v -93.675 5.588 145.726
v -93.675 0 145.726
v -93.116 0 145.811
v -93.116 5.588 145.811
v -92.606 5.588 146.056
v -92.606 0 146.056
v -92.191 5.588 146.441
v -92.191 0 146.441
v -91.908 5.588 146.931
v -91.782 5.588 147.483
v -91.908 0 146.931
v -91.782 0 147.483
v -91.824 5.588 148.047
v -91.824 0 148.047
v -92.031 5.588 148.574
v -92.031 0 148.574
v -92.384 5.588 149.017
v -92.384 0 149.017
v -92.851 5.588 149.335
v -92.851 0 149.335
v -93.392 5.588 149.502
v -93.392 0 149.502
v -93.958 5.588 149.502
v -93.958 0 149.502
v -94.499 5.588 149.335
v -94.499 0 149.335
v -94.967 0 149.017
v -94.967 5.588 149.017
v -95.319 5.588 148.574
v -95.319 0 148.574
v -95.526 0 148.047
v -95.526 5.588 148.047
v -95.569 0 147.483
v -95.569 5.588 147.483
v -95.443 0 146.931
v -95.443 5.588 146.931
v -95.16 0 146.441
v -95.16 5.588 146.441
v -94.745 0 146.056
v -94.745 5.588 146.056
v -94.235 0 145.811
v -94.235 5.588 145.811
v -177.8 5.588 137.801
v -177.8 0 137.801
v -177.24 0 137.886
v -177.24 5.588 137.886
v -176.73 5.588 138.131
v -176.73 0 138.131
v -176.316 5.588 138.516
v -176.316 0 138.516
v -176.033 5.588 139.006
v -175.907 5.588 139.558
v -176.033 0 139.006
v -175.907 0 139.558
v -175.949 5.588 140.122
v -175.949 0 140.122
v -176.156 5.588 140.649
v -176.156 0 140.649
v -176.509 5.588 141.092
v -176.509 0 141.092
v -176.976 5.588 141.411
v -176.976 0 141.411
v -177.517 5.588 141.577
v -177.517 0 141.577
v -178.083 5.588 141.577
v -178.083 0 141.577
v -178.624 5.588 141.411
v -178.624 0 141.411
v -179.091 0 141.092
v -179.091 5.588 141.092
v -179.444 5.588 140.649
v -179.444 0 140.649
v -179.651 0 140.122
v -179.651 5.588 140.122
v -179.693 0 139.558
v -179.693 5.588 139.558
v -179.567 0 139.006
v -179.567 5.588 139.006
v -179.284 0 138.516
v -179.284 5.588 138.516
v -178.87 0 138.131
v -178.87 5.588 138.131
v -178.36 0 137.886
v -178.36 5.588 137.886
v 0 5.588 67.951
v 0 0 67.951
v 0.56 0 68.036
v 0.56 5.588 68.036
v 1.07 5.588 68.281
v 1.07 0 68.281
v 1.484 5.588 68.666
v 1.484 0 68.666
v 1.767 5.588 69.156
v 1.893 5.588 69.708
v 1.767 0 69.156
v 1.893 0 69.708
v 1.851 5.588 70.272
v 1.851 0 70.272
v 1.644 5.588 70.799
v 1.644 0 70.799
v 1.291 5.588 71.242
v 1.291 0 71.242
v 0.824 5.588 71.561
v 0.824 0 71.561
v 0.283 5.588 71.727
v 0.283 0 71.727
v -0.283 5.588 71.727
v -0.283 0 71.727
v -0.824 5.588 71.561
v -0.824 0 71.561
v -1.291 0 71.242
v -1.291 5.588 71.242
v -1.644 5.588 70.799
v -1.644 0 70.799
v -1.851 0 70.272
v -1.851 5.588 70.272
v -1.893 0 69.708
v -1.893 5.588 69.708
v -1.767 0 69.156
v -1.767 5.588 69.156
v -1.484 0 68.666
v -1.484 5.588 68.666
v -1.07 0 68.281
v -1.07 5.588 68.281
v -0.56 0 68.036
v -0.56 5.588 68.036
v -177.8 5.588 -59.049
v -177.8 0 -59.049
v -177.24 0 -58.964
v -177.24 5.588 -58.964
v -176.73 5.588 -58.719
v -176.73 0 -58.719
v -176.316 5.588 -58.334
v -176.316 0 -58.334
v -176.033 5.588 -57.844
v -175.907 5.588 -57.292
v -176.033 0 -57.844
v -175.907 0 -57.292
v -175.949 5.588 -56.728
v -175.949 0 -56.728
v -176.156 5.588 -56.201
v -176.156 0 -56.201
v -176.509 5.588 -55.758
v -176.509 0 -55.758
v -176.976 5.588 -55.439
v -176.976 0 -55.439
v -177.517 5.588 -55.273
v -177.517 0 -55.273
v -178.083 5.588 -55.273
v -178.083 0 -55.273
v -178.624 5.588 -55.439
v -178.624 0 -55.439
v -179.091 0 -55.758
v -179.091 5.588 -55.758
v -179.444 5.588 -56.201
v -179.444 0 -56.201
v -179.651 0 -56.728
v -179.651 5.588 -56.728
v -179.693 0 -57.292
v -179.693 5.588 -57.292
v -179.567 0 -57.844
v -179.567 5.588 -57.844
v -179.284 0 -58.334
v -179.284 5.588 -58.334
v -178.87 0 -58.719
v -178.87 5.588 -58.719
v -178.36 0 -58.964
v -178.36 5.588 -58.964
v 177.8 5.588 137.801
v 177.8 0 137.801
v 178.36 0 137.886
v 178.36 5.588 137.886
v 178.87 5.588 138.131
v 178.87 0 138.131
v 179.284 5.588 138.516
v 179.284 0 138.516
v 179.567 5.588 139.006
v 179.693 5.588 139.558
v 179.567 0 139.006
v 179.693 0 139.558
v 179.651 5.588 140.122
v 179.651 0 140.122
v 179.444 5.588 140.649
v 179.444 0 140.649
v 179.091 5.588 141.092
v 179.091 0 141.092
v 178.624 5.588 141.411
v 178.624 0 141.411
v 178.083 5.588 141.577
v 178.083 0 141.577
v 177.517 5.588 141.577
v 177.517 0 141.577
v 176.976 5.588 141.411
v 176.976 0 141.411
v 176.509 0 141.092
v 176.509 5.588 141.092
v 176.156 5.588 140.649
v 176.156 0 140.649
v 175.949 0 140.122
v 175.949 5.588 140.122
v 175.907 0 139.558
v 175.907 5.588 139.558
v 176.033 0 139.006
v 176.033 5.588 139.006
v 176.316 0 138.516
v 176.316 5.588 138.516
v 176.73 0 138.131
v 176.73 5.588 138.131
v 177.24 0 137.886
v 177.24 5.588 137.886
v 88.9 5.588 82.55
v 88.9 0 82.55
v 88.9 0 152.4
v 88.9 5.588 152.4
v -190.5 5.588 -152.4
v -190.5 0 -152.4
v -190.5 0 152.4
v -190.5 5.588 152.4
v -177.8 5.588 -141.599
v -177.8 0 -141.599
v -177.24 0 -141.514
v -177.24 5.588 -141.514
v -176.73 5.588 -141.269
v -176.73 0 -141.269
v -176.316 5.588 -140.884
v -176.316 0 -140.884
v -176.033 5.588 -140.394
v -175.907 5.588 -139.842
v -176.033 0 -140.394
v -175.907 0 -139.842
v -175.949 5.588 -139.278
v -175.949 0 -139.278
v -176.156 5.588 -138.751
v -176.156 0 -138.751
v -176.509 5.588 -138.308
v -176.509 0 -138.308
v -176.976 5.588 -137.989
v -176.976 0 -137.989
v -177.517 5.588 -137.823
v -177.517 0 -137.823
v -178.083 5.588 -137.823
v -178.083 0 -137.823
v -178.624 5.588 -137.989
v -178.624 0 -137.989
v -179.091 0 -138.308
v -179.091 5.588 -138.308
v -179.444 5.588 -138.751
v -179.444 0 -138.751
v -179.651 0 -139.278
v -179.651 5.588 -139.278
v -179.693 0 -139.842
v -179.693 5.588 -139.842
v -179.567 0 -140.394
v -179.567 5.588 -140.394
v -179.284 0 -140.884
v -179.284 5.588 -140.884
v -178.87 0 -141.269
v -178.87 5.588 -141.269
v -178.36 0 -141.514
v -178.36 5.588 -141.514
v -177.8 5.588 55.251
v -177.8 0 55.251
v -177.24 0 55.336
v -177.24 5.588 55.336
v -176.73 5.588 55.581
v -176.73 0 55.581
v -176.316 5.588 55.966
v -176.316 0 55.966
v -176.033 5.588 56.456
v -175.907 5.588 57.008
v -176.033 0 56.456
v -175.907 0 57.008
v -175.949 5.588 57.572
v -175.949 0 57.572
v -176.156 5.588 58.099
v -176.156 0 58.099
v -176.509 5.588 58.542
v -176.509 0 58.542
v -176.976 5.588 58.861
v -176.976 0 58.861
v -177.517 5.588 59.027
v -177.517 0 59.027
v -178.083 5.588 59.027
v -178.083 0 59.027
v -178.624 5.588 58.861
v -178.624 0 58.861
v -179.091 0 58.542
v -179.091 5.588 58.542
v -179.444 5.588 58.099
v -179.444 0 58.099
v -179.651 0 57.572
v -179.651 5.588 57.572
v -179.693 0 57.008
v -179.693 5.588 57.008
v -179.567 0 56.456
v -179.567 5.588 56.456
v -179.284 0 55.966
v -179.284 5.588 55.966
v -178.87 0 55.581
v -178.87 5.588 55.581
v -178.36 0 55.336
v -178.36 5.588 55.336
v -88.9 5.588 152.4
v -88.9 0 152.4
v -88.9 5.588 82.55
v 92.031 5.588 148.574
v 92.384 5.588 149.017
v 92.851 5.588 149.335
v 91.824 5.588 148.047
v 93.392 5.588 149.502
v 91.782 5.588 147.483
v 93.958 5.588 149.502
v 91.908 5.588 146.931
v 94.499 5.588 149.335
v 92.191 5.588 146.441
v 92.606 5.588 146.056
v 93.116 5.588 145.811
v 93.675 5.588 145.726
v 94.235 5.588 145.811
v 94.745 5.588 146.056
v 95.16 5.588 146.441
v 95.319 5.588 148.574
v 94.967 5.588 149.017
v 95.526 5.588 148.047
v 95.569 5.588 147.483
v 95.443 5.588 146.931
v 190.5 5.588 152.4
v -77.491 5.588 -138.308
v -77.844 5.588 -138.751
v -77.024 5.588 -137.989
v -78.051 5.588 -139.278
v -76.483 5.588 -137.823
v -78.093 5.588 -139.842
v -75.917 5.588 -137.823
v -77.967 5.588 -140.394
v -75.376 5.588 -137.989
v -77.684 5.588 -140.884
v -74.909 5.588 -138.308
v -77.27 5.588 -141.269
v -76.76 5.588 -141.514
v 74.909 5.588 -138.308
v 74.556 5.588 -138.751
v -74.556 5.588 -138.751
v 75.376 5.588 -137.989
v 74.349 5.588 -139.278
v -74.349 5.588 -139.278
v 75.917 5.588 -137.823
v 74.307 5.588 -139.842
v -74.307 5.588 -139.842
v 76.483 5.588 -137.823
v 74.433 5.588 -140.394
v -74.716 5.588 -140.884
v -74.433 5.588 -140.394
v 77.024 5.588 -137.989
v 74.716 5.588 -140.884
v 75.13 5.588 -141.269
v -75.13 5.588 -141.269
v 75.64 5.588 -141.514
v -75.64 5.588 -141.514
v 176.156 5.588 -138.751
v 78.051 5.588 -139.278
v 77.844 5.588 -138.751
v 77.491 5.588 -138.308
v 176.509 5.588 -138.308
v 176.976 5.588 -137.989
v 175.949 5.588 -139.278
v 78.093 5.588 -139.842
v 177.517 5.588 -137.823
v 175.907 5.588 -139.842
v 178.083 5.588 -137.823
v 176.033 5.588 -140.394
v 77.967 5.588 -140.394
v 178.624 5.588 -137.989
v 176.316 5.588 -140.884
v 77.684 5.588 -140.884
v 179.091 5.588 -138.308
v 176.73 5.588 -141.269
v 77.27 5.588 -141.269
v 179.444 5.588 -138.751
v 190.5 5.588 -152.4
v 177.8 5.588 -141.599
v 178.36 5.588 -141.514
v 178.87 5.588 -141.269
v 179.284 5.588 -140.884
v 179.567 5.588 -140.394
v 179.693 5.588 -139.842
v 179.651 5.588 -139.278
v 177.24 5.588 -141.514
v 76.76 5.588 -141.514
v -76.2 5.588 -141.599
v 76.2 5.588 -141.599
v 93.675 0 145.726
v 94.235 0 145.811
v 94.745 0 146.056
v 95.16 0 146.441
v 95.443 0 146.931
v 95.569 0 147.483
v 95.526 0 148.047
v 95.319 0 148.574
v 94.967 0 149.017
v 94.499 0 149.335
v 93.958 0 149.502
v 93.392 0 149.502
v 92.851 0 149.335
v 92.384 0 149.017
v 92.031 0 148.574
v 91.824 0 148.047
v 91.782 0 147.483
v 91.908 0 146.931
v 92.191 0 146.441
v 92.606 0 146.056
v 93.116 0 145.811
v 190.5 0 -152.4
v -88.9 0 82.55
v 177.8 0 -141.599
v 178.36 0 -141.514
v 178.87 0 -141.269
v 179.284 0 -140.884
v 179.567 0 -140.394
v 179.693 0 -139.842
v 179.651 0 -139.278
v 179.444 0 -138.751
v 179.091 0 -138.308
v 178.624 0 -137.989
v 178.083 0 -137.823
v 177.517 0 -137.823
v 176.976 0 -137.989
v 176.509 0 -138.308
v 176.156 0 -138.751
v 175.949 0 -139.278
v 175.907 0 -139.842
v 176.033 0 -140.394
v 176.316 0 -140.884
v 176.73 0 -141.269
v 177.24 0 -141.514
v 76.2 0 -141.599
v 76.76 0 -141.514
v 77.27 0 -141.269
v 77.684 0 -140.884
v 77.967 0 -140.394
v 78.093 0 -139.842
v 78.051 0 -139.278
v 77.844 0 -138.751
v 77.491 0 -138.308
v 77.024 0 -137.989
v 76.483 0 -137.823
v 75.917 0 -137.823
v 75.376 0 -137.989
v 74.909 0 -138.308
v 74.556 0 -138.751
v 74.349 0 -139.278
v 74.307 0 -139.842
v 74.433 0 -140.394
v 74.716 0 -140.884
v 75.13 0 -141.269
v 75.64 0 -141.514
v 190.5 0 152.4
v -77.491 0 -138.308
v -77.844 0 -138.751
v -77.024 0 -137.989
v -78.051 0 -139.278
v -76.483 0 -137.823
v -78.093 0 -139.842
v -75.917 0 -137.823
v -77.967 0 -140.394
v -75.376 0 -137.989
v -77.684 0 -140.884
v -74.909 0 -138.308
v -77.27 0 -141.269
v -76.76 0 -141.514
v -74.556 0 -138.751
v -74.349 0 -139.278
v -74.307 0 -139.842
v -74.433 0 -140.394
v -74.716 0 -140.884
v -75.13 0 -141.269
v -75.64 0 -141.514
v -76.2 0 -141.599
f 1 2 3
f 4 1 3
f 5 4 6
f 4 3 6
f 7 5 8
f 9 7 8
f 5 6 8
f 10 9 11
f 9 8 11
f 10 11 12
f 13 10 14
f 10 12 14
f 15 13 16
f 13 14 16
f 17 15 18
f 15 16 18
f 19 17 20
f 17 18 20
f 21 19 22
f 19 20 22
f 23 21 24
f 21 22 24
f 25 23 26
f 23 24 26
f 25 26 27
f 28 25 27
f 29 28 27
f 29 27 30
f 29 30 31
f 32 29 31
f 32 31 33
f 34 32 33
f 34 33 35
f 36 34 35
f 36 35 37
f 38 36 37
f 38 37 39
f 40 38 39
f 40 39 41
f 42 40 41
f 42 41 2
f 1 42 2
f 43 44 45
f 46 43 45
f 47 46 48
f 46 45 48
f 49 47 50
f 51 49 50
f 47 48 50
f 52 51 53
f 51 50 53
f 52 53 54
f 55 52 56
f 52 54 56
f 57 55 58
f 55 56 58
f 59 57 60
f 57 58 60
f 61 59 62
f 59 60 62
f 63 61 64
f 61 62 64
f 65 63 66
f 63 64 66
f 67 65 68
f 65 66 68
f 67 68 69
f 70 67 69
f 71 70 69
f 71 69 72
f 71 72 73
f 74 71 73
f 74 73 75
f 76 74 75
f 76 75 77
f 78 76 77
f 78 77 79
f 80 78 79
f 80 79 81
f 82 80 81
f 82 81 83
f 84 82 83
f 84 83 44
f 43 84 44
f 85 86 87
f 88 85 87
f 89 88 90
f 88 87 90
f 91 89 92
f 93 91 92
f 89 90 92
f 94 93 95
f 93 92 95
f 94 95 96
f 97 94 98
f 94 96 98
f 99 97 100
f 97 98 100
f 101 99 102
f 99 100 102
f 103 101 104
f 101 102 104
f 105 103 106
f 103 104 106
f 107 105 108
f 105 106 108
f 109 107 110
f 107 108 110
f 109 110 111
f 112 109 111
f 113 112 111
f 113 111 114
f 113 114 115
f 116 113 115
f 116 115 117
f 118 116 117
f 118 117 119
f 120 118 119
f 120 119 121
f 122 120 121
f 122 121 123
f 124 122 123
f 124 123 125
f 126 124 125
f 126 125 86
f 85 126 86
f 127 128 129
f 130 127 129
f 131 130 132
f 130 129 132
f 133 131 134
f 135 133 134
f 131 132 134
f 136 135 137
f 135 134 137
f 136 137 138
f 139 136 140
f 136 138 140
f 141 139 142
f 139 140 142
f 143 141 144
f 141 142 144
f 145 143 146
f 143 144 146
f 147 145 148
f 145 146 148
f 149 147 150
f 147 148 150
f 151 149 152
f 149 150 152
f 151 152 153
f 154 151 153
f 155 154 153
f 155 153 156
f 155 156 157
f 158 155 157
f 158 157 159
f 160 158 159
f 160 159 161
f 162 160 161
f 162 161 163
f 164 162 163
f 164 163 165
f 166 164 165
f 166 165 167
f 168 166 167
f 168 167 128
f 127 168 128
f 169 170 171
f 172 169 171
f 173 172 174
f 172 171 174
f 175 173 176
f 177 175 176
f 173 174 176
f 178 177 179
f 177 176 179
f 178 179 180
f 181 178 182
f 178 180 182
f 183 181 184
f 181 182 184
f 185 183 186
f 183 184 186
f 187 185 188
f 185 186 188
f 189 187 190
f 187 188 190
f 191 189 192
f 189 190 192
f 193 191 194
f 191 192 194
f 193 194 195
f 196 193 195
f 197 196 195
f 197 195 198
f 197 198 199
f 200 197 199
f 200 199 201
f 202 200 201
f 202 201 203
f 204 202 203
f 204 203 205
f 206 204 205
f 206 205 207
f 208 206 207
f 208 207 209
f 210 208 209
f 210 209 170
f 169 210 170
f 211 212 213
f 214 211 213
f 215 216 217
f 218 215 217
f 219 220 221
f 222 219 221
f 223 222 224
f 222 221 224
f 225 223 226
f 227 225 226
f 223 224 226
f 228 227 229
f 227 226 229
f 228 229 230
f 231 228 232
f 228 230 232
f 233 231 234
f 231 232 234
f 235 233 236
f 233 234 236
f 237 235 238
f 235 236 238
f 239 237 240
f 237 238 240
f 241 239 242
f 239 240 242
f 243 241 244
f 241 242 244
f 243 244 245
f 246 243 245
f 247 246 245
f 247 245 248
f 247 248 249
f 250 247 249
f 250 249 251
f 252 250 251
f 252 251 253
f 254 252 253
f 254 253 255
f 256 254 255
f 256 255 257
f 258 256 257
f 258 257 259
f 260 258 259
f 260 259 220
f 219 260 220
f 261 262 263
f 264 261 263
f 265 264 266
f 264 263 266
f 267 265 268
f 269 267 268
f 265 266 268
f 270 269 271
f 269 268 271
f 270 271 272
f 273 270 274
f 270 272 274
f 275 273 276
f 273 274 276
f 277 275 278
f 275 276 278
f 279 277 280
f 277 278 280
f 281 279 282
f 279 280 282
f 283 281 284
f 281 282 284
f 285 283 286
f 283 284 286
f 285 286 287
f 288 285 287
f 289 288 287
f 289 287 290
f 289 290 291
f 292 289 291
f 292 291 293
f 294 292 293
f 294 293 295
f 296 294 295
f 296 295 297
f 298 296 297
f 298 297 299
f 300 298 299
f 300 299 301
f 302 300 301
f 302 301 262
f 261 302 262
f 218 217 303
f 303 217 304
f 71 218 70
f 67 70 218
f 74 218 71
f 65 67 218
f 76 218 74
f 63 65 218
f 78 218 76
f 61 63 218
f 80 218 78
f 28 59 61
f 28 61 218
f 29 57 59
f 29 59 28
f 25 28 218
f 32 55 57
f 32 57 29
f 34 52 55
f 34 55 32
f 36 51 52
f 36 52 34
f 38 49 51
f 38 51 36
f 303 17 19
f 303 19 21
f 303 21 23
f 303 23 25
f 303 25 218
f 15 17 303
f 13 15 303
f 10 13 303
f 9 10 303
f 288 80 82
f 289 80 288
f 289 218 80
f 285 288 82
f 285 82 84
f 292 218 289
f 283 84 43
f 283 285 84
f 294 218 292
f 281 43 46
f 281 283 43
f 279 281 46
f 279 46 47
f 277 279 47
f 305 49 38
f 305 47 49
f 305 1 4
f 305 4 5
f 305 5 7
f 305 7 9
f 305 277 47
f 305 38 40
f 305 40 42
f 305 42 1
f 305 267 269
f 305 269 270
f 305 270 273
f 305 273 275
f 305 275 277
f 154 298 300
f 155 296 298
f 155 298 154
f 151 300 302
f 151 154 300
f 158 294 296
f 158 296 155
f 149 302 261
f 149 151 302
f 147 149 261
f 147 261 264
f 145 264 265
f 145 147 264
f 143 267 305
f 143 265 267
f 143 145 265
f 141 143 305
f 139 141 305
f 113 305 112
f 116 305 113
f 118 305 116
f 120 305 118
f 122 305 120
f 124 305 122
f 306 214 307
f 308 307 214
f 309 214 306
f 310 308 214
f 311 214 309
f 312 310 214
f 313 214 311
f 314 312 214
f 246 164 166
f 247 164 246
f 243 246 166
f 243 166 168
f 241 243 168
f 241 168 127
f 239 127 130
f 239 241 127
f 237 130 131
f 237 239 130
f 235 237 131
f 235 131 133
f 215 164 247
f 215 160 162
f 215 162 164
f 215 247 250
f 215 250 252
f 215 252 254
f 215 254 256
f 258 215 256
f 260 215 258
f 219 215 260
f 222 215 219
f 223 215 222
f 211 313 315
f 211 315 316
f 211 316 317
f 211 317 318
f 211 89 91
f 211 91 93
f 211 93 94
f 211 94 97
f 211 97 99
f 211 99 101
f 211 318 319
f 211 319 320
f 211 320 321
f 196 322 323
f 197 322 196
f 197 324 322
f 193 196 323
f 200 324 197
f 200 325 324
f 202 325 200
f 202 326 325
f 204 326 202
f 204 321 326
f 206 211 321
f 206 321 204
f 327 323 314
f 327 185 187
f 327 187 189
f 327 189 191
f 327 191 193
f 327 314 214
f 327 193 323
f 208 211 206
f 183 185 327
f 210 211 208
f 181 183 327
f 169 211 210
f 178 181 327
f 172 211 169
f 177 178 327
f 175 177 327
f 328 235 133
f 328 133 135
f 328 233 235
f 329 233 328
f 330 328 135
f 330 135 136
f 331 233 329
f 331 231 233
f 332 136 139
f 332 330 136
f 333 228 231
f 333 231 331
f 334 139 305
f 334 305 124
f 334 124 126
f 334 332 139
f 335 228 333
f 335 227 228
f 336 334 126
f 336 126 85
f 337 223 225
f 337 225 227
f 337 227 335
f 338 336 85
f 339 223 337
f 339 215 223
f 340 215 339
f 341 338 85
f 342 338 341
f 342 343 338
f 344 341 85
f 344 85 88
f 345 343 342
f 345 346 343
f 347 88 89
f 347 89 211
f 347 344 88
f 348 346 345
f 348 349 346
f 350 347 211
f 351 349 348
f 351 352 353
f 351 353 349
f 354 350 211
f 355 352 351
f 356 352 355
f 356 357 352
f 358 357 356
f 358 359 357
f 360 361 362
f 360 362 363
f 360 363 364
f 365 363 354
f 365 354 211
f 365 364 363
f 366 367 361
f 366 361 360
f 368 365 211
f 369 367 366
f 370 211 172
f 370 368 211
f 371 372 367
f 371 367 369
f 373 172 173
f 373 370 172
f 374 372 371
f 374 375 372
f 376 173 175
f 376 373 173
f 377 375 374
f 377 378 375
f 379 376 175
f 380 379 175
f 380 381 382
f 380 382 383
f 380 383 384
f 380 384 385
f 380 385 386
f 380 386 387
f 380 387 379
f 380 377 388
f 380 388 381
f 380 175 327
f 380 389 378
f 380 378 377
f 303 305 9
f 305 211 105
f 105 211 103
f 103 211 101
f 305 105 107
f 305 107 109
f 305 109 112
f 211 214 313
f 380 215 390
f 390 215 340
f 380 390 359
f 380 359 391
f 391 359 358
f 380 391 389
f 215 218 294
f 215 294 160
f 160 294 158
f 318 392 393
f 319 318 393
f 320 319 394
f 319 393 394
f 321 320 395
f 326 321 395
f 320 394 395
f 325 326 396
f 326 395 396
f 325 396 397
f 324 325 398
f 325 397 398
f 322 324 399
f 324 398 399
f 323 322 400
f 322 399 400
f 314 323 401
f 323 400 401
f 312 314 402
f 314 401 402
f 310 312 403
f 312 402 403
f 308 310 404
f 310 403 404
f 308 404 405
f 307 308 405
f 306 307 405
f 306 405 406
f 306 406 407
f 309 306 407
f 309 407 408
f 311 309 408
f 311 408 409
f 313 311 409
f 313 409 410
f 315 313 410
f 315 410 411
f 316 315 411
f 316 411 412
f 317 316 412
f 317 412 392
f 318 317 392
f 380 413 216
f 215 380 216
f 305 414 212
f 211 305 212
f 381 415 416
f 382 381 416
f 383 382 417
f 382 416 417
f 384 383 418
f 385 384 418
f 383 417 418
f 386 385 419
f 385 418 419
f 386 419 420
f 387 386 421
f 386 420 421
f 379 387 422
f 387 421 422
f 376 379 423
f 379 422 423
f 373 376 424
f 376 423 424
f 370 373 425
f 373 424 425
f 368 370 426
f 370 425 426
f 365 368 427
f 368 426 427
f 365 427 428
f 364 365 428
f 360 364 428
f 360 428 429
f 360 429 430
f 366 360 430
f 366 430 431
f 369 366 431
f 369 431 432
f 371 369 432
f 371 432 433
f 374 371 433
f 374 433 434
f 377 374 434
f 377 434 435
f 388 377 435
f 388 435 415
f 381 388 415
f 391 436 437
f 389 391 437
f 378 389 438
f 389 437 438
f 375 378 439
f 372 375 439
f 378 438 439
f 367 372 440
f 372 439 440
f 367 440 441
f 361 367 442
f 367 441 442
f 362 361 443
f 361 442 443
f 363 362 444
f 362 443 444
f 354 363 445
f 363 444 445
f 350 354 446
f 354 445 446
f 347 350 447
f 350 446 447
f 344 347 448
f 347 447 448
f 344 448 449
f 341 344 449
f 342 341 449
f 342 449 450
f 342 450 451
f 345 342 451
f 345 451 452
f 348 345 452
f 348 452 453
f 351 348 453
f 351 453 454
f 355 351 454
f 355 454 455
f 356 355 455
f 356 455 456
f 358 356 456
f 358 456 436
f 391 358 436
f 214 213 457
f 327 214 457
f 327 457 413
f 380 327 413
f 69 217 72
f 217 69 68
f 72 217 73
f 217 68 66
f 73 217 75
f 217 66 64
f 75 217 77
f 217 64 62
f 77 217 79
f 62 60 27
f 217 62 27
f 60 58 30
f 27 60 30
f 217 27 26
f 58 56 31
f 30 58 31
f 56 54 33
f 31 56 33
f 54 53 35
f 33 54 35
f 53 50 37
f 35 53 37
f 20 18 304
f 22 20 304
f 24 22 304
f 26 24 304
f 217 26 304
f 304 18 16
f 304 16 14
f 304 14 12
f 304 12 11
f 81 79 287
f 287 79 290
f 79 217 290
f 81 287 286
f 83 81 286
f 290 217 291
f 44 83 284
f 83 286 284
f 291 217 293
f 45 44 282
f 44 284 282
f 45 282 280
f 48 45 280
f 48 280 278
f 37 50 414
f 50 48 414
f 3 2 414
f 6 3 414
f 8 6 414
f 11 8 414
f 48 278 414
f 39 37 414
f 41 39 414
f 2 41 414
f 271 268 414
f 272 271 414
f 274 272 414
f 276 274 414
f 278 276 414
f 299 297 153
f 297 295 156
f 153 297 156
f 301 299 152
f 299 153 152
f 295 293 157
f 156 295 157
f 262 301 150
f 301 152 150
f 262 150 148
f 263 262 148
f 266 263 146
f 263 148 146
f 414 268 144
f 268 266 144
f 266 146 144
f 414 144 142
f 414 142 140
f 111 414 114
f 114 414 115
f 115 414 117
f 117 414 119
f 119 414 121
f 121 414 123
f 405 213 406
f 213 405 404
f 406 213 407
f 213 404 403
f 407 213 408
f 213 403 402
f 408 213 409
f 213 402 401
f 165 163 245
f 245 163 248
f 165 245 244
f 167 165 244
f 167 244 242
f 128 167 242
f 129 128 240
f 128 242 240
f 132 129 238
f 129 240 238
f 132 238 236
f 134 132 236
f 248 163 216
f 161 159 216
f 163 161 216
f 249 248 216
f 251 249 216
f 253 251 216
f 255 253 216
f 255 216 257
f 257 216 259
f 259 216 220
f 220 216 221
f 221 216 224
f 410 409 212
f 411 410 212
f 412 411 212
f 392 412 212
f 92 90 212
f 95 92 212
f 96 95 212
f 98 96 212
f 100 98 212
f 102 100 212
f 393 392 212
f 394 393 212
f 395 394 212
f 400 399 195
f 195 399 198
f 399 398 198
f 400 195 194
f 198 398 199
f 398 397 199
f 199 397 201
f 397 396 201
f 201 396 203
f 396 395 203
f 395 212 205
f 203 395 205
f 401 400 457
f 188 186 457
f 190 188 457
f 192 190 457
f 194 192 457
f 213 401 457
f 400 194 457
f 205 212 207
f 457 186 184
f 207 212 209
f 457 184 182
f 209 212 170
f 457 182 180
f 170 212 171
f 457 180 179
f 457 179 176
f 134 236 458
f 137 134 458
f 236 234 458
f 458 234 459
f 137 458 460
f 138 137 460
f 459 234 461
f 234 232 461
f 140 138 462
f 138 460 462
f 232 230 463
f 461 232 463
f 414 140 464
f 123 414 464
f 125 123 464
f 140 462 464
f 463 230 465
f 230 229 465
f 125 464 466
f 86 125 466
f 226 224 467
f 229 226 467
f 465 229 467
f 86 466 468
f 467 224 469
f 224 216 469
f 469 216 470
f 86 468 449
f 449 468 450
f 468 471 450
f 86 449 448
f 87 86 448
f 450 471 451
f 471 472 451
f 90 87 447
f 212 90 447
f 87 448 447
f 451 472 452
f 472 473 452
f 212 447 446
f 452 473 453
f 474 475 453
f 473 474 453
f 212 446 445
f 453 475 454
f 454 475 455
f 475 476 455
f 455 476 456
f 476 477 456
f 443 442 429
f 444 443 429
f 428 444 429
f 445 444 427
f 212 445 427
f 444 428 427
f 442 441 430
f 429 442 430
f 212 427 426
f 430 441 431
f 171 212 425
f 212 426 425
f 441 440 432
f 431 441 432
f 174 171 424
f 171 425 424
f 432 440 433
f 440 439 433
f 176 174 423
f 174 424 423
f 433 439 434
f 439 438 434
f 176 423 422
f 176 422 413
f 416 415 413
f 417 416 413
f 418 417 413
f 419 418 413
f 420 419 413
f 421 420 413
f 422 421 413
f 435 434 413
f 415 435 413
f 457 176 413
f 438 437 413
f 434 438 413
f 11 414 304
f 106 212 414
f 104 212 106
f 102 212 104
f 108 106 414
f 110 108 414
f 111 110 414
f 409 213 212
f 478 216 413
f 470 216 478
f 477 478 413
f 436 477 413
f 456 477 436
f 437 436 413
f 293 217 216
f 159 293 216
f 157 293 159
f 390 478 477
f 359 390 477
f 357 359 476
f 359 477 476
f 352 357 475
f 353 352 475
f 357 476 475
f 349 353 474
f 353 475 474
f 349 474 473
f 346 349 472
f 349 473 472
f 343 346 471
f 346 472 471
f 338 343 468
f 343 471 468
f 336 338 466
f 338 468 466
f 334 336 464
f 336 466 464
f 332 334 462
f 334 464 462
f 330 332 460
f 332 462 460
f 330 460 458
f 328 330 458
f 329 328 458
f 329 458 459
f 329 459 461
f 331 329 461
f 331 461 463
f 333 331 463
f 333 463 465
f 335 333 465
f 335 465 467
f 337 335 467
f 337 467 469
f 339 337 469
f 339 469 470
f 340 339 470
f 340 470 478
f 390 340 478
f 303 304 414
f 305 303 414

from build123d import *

# Parameters (mm, degrees)
BOSS_EXTRUDE1_DEPTH   = 5.588
F_6_CLEARANCE_HOLE1_D = 3.7973


with BuildPart() as part:
    # Sketch1 → Boss-Extrude1 (new body)
    with BuildSketch(Plane(origin=(0, 0, 0), x_dir=(1, 0, 0), z_dir=(0, 1, 0))):
        Polygon((-190.5, -152.4), (-88.9, -152.4), (-88.9, -82.55), (88.9, -82.55), (88.9, -152.4), (190.5, -152.4), (190.5, 152.4), (-190.5, 152.4), align=None)
    extrude(amount=BOSS_EXTRUDE1_DEPTH)

    # #6 Clearance Hole1 (through all)
    with Locations(Plane(origin=(-76.2, 5.588, -139.7), x_dir=(0, 0, 1), z_dir=(0, 1, 0))):
        with Locations((0, 0), (0, 152.4), (209.55, 76.2), (287.3248, -17.4752), (279.4, -101.6), (0, -101.6), (0, 254), (279.4, 254), (287.3248, 169.8752), (82.55, -101.6), (196.85, -101.6)):
            Hole(F_6_CLEARANCE_HOLE1_D / 2)


solid = part.part
